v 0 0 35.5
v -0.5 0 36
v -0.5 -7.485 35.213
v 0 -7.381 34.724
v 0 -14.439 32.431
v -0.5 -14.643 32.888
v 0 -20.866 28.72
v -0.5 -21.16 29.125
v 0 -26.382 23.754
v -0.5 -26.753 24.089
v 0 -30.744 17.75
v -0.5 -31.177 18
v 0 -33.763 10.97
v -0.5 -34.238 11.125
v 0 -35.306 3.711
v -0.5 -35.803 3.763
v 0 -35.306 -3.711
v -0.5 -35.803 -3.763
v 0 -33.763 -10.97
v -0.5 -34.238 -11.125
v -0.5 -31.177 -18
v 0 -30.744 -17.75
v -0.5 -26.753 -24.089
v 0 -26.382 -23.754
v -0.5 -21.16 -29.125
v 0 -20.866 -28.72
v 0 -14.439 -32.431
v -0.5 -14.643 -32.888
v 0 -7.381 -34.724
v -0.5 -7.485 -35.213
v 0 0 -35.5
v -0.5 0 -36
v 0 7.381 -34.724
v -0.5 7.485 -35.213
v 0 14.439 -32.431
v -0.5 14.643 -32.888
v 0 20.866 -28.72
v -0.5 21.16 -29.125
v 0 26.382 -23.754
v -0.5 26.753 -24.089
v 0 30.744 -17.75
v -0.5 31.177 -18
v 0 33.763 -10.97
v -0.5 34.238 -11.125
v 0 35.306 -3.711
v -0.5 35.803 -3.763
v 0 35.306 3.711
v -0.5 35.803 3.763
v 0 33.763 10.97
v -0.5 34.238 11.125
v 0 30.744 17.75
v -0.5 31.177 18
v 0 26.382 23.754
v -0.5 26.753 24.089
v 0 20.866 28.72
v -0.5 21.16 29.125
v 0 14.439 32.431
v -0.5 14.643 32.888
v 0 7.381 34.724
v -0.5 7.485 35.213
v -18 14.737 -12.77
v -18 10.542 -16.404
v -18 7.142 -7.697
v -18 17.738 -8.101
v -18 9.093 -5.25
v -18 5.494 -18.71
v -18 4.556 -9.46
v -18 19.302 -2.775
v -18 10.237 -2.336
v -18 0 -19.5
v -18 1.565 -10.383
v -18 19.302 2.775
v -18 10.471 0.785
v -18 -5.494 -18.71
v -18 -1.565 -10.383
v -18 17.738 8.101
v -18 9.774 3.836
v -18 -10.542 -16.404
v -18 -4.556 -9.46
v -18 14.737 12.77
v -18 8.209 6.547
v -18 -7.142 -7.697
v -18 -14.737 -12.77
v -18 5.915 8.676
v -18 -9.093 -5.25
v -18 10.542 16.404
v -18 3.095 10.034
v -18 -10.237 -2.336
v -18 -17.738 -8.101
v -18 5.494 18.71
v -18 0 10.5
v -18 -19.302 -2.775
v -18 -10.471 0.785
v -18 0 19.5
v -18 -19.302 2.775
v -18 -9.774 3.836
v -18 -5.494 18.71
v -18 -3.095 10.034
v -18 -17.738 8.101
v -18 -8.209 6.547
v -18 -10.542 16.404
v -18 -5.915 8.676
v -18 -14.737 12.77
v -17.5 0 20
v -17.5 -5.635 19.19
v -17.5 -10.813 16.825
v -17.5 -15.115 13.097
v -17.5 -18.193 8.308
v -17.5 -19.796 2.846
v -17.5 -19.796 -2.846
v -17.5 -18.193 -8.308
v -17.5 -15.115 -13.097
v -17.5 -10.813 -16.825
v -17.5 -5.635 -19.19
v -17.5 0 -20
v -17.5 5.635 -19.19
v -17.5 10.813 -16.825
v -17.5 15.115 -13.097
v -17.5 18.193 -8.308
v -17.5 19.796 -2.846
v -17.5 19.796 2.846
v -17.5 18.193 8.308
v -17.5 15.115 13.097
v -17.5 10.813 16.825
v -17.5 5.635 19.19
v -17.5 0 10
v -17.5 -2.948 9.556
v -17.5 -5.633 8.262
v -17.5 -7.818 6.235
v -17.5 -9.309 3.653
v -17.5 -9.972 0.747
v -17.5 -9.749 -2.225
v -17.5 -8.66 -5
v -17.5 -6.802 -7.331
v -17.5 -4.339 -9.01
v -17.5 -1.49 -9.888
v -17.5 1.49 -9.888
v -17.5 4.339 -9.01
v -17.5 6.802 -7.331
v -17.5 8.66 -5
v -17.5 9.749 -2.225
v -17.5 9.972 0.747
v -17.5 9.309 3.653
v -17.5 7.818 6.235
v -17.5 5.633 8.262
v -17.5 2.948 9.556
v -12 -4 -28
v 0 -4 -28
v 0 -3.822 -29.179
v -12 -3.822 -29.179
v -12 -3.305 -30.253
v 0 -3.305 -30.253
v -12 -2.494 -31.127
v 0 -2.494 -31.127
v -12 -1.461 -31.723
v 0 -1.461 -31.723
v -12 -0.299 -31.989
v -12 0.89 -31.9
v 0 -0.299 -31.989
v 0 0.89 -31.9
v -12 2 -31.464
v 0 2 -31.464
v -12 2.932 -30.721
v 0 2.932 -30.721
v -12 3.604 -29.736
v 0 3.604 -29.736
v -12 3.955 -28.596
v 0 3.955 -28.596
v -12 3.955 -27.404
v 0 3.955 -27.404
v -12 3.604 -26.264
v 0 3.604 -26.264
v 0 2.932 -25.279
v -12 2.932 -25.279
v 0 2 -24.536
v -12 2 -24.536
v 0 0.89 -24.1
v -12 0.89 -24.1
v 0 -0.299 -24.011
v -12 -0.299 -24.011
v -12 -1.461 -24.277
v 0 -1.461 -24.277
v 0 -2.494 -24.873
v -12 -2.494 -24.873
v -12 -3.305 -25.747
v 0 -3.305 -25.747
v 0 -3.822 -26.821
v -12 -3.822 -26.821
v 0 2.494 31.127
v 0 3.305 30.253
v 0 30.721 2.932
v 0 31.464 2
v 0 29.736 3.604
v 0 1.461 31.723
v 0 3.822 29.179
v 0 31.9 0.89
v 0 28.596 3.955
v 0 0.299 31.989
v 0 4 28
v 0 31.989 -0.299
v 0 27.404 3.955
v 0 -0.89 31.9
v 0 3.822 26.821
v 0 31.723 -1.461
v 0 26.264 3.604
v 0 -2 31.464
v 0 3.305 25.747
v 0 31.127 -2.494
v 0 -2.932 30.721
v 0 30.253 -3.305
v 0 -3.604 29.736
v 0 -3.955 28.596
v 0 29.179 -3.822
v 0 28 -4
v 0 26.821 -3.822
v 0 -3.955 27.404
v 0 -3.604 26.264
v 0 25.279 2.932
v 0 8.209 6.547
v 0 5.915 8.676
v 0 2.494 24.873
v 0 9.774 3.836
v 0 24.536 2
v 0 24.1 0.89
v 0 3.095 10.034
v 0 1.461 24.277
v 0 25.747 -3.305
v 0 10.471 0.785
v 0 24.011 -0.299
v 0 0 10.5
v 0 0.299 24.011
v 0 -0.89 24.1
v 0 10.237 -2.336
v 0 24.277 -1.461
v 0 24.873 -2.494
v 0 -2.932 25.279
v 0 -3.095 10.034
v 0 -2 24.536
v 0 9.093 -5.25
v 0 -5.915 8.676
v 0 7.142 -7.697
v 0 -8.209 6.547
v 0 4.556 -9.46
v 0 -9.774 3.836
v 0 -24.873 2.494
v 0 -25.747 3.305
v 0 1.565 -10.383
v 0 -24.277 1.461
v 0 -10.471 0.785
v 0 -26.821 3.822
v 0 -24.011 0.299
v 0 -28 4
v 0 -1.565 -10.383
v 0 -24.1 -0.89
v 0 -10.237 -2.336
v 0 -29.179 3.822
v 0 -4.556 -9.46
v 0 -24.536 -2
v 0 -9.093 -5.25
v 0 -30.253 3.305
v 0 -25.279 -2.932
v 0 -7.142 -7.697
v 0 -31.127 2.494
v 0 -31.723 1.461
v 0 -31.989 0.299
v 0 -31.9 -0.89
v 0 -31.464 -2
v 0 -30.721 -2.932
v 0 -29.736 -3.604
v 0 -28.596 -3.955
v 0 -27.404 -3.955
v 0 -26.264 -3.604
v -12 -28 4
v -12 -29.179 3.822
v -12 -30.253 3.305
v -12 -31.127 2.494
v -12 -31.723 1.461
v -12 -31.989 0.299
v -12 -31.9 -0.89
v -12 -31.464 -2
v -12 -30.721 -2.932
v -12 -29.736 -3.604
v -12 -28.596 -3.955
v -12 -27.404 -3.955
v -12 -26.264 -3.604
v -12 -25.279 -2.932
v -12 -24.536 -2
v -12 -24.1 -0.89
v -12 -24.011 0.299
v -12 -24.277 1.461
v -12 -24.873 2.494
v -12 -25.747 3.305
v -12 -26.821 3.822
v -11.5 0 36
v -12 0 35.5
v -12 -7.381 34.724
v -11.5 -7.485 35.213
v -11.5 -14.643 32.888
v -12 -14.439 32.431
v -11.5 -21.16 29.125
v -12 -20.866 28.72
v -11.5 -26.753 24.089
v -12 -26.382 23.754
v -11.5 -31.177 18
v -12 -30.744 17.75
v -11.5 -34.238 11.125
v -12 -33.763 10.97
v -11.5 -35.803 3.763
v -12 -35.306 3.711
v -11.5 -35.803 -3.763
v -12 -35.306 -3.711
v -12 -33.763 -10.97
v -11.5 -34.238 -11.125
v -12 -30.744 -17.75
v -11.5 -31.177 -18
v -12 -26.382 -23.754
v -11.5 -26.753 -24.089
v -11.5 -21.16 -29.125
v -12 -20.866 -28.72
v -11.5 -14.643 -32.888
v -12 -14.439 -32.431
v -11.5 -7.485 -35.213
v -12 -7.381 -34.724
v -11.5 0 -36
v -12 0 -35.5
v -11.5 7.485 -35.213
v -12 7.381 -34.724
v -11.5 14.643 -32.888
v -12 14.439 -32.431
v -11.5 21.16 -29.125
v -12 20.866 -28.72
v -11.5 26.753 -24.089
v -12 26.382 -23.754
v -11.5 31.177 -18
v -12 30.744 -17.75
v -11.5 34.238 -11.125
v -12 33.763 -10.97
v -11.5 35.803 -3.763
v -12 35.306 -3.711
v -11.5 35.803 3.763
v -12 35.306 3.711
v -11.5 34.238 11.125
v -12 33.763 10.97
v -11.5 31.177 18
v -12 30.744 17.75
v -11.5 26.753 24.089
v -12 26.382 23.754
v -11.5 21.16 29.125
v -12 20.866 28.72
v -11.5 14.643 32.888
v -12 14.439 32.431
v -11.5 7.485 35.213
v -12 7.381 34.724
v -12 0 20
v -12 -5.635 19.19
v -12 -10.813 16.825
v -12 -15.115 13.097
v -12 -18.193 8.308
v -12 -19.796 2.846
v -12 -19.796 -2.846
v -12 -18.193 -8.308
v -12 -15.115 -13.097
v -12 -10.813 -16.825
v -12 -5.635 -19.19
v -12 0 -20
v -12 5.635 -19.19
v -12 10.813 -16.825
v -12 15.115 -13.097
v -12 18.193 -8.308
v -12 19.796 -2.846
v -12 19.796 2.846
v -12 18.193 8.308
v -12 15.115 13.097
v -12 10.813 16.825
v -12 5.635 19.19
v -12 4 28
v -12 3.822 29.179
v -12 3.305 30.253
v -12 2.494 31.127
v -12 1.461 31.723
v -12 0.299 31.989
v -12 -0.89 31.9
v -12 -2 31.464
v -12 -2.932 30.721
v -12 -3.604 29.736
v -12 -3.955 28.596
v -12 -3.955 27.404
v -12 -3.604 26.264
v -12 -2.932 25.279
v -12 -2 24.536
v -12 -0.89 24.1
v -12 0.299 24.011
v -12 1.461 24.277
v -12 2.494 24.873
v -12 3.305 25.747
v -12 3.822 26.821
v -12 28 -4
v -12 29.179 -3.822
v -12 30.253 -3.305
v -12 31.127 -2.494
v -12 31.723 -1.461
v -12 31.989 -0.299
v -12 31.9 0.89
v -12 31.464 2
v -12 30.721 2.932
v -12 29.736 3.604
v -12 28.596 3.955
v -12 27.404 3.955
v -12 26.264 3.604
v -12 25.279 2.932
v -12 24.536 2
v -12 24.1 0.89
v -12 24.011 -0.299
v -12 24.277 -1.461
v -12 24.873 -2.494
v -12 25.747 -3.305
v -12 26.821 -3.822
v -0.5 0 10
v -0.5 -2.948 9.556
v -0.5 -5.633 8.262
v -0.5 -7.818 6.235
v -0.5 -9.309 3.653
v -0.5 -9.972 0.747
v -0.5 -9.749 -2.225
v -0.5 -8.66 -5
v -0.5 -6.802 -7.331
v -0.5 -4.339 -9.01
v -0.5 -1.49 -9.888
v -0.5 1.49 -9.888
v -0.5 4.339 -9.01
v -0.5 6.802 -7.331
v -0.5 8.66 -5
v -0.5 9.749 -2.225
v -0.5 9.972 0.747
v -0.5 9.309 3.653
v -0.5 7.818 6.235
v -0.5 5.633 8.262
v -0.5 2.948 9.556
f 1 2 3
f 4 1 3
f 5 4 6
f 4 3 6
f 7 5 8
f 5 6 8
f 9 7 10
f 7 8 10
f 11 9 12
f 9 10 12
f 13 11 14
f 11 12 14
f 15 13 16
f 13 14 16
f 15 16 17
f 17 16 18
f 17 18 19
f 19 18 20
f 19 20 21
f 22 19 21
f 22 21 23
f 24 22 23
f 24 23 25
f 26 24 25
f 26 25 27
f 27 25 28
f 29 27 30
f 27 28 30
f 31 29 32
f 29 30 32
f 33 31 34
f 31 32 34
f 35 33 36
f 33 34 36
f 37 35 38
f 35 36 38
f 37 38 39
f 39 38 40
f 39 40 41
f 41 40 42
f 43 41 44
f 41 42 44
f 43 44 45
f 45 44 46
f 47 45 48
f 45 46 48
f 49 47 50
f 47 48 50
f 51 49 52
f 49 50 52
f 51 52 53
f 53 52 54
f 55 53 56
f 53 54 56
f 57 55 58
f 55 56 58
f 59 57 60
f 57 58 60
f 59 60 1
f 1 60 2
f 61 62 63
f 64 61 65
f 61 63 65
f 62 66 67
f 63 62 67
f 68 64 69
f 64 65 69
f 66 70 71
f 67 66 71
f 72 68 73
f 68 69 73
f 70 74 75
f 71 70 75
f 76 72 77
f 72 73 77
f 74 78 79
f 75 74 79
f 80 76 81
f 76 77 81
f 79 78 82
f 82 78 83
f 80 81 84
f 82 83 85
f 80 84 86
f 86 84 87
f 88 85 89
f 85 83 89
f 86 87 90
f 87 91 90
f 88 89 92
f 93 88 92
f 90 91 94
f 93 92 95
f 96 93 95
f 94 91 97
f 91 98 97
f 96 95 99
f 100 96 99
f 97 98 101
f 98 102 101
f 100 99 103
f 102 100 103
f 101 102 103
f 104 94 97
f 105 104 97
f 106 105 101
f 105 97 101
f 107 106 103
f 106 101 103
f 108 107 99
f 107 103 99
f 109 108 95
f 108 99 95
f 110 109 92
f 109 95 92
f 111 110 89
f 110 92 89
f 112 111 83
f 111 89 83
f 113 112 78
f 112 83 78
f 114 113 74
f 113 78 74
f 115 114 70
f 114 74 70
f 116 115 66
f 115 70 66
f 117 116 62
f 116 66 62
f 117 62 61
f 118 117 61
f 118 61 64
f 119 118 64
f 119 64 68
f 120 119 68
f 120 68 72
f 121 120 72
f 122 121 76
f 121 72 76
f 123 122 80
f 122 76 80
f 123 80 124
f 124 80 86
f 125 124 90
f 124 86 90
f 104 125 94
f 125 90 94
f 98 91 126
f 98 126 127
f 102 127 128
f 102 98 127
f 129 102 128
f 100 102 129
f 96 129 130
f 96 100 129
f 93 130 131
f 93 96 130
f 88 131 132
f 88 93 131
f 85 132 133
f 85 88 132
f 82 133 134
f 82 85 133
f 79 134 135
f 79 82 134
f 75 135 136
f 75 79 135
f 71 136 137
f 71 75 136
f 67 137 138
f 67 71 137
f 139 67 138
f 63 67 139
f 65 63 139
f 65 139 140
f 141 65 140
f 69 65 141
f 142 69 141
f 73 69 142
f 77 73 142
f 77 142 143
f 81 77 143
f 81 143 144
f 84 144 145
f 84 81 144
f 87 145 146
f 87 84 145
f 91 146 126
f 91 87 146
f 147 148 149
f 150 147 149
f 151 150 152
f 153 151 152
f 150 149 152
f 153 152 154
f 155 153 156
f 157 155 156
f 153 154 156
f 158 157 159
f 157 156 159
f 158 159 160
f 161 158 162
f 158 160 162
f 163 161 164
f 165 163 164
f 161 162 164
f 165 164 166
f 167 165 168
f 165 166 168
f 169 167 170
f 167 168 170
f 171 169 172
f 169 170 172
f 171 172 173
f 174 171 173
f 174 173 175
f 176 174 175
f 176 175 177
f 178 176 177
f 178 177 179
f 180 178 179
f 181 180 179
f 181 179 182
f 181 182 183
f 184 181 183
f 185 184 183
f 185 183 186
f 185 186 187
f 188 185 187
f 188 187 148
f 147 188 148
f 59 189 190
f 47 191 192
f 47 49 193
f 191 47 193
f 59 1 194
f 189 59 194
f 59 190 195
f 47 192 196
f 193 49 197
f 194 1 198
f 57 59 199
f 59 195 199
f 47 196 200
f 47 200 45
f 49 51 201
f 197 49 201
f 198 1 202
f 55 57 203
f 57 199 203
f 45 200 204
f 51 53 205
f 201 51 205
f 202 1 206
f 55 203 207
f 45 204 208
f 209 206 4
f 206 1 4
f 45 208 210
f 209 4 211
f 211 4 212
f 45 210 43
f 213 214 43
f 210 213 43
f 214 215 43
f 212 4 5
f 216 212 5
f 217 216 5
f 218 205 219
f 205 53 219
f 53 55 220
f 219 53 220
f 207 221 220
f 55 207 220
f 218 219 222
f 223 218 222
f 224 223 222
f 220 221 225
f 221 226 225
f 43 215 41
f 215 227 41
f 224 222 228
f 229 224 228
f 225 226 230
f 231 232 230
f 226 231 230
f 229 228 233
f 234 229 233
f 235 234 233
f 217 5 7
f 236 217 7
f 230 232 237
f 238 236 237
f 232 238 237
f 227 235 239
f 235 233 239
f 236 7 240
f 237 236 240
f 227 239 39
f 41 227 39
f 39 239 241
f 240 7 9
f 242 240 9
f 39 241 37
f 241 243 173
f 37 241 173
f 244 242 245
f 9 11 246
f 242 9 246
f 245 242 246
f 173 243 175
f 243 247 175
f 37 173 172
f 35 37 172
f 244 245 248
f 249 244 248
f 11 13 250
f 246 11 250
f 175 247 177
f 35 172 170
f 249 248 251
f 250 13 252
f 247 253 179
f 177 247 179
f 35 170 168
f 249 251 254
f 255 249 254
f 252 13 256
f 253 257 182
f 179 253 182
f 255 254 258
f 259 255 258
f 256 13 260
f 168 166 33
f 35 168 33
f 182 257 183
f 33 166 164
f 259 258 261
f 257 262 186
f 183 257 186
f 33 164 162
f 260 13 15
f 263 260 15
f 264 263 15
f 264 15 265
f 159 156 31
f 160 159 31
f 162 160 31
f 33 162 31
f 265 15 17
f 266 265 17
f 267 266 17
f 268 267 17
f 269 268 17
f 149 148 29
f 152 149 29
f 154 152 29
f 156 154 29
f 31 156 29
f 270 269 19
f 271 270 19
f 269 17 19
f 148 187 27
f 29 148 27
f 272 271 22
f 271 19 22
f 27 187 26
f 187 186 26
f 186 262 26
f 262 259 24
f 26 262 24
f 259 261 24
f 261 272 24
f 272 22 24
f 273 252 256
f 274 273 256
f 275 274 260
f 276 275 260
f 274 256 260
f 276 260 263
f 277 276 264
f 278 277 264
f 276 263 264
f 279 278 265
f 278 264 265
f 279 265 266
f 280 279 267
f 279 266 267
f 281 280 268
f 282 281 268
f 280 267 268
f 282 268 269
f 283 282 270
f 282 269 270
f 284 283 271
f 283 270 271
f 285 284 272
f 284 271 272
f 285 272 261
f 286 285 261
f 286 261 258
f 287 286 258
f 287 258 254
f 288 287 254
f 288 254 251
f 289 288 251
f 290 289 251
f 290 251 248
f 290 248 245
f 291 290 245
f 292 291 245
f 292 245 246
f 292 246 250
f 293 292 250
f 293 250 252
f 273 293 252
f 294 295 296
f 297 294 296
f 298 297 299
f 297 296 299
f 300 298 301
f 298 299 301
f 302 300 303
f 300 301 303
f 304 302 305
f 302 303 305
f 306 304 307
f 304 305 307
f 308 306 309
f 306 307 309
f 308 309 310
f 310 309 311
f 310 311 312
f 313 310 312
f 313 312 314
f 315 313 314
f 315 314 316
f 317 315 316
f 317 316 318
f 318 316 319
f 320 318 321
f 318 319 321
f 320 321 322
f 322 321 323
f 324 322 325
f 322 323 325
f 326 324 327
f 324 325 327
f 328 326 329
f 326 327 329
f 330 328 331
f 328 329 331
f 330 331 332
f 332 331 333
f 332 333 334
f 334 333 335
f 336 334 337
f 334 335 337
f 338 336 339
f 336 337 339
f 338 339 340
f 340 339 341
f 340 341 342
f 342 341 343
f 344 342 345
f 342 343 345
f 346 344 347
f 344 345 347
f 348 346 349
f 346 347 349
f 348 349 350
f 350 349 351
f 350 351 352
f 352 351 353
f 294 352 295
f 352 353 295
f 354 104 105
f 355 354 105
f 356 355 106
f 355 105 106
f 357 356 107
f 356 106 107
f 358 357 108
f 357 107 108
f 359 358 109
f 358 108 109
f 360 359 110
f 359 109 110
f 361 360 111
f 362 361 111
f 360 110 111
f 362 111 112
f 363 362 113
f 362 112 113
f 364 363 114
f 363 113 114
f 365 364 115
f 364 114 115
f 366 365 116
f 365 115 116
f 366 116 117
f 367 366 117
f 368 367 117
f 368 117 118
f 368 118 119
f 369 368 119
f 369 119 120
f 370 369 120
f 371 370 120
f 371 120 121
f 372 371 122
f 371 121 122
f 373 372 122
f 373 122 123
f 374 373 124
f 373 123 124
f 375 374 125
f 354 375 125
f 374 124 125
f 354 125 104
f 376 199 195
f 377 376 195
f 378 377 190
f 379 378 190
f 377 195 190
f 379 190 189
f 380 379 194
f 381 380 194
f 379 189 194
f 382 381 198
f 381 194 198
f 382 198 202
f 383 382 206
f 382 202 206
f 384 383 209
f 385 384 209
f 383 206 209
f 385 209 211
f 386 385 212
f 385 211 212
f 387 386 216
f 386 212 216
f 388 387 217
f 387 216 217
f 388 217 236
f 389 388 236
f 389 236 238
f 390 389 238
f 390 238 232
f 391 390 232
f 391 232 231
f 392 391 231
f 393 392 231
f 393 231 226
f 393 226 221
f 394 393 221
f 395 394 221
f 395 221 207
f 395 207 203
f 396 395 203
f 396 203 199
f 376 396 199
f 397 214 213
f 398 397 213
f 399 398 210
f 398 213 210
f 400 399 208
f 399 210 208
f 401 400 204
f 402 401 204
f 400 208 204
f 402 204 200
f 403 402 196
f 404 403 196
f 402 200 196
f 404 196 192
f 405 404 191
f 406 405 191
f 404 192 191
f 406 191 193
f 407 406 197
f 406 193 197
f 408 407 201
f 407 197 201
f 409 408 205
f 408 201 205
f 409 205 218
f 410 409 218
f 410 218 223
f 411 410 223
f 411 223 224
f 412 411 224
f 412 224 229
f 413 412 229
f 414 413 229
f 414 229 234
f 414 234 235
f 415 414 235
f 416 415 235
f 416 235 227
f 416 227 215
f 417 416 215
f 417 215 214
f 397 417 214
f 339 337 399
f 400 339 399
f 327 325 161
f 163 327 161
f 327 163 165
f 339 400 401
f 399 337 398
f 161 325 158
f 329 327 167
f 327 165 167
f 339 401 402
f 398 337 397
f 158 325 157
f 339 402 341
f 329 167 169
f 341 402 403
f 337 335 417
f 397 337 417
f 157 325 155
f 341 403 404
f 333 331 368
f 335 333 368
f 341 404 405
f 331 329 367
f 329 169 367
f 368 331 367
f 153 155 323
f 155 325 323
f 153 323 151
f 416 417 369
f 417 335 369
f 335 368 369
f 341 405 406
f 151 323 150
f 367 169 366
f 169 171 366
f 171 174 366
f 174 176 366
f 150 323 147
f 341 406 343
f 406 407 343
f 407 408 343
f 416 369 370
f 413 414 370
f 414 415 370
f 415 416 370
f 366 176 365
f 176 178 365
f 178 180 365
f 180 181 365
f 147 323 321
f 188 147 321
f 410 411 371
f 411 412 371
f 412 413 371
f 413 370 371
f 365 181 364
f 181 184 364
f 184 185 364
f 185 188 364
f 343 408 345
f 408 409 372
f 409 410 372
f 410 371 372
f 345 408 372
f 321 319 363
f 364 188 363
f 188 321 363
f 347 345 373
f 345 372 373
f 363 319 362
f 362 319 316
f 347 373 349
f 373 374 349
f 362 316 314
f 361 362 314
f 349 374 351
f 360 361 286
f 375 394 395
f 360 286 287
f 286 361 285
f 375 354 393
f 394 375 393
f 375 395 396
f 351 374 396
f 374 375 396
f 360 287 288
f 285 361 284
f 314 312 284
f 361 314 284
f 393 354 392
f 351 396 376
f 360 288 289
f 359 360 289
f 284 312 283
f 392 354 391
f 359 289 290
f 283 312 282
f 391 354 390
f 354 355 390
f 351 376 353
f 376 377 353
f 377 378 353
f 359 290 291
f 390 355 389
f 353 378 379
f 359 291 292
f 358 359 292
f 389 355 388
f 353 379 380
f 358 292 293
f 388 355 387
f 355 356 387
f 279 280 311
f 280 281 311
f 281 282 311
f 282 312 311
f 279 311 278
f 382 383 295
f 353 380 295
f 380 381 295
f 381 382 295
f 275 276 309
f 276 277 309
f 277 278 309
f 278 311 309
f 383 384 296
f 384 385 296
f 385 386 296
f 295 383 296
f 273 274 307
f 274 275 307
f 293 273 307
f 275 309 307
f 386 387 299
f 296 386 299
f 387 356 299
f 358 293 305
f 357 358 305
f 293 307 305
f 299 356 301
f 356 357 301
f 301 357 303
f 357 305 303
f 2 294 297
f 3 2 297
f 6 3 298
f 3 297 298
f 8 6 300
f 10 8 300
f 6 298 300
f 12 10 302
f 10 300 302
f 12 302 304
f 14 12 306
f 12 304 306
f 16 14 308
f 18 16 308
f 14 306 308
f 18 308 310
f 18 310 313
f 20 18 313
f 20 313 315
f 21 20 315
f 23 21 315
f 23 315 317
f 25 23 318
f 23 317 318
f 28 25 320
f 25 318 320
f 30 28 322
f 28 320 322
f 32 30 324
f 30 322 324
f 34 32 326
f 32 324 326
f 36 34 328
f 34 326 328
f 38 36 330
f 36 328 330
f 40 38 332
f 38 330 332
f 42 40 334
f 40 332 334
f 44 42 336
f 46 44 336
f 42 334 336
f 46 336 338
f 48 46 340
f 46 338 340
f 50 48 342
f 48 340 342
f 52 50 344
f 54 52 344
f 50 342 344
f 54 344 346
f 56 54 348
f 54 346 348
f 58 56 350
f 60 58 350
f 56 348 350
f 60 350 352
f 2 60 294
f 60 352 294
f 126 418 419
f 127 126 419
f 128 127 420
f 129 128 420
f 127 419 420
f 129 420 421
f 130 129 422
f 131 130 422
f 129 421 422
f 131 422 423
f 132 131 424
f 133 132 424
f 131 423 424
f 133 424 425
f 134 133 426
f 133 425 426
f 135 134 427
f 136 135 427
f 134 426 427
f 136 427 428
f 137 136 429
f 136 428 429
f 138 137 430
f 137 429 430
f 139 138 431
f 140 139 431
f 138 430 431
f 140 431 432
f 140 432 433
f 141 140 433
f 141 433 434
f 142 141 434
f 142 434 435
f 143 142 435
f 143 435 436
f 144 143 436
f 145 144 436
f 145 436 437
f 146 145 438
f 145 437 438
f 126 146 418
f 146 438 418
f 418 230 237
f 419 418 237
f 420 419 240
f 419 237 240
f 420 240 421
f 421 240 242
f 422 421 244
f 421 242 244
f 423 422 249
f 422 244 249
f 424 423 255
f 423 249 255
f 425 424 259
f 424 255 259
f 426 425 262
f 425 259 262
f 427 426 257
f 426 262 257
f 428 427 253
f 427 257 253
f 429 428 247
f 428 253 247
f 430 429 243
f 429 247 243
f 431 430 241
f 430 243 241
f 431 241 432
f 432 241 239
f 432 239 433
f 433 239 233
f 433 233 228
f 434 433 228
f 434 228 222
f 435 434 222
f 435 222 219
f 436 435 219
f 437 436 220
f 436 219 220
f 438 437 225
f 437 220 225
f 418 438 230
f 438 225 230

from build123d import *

# Parameters (mm, degrees)
F2_SIZE         = 0.5
F3_R            = 4
F4_DEPTH        = 18.001
F4_COPIES_COUNT = 4


# Not quite as in the source:
# - a pattern or mirror of a feature is missing from the dataset's text; its kind, count and spacing are read off the source's solid


with BuildPart() as f1:
    # F0 (on Front) → F1 (revolve)
    with BuildSketch(Plane.XZ):
        Polygon((-18, 10), (0, 10), (0, 36), (-12, 36), (-12, 20), (-18, 20), align=None)
    revolve(axis=Axis((-9, 0, 0), (1, 0, 0)))

    # F2
    f2_edges = [f1.edges().sort_by_distance(p)[0] for p in [
        (-18, 0, -20),
        (-18, 0, -10),
        (-12, 0, -36),
        (0, 0, -10),
        (0, 0, -36),
    ]]
    chamfer(f2_edges, length=F2_SIZE)

    # F3 (on Right) → F4 (cut, through all)
    with BuildSketch(Plane.YZ):
        with Locations((0, 28)):
            Circle(F3_R)
    f4 = extrude(amount=-F4_DEPTH, mode=Mode.SUBTRACT)

    # F4_copies: F4 ×4 about axis
    f4_copies_axis = Axis((0, 0, 0), (1, 0, 0))
    for i in range(1, F4_COPIES_COUNT):
        add(f4.rotate(f4_copies_axis, i * 360 / F4_COPIES_COUNT), mode=Mode.SUBTRACT)


solid = f1.part
